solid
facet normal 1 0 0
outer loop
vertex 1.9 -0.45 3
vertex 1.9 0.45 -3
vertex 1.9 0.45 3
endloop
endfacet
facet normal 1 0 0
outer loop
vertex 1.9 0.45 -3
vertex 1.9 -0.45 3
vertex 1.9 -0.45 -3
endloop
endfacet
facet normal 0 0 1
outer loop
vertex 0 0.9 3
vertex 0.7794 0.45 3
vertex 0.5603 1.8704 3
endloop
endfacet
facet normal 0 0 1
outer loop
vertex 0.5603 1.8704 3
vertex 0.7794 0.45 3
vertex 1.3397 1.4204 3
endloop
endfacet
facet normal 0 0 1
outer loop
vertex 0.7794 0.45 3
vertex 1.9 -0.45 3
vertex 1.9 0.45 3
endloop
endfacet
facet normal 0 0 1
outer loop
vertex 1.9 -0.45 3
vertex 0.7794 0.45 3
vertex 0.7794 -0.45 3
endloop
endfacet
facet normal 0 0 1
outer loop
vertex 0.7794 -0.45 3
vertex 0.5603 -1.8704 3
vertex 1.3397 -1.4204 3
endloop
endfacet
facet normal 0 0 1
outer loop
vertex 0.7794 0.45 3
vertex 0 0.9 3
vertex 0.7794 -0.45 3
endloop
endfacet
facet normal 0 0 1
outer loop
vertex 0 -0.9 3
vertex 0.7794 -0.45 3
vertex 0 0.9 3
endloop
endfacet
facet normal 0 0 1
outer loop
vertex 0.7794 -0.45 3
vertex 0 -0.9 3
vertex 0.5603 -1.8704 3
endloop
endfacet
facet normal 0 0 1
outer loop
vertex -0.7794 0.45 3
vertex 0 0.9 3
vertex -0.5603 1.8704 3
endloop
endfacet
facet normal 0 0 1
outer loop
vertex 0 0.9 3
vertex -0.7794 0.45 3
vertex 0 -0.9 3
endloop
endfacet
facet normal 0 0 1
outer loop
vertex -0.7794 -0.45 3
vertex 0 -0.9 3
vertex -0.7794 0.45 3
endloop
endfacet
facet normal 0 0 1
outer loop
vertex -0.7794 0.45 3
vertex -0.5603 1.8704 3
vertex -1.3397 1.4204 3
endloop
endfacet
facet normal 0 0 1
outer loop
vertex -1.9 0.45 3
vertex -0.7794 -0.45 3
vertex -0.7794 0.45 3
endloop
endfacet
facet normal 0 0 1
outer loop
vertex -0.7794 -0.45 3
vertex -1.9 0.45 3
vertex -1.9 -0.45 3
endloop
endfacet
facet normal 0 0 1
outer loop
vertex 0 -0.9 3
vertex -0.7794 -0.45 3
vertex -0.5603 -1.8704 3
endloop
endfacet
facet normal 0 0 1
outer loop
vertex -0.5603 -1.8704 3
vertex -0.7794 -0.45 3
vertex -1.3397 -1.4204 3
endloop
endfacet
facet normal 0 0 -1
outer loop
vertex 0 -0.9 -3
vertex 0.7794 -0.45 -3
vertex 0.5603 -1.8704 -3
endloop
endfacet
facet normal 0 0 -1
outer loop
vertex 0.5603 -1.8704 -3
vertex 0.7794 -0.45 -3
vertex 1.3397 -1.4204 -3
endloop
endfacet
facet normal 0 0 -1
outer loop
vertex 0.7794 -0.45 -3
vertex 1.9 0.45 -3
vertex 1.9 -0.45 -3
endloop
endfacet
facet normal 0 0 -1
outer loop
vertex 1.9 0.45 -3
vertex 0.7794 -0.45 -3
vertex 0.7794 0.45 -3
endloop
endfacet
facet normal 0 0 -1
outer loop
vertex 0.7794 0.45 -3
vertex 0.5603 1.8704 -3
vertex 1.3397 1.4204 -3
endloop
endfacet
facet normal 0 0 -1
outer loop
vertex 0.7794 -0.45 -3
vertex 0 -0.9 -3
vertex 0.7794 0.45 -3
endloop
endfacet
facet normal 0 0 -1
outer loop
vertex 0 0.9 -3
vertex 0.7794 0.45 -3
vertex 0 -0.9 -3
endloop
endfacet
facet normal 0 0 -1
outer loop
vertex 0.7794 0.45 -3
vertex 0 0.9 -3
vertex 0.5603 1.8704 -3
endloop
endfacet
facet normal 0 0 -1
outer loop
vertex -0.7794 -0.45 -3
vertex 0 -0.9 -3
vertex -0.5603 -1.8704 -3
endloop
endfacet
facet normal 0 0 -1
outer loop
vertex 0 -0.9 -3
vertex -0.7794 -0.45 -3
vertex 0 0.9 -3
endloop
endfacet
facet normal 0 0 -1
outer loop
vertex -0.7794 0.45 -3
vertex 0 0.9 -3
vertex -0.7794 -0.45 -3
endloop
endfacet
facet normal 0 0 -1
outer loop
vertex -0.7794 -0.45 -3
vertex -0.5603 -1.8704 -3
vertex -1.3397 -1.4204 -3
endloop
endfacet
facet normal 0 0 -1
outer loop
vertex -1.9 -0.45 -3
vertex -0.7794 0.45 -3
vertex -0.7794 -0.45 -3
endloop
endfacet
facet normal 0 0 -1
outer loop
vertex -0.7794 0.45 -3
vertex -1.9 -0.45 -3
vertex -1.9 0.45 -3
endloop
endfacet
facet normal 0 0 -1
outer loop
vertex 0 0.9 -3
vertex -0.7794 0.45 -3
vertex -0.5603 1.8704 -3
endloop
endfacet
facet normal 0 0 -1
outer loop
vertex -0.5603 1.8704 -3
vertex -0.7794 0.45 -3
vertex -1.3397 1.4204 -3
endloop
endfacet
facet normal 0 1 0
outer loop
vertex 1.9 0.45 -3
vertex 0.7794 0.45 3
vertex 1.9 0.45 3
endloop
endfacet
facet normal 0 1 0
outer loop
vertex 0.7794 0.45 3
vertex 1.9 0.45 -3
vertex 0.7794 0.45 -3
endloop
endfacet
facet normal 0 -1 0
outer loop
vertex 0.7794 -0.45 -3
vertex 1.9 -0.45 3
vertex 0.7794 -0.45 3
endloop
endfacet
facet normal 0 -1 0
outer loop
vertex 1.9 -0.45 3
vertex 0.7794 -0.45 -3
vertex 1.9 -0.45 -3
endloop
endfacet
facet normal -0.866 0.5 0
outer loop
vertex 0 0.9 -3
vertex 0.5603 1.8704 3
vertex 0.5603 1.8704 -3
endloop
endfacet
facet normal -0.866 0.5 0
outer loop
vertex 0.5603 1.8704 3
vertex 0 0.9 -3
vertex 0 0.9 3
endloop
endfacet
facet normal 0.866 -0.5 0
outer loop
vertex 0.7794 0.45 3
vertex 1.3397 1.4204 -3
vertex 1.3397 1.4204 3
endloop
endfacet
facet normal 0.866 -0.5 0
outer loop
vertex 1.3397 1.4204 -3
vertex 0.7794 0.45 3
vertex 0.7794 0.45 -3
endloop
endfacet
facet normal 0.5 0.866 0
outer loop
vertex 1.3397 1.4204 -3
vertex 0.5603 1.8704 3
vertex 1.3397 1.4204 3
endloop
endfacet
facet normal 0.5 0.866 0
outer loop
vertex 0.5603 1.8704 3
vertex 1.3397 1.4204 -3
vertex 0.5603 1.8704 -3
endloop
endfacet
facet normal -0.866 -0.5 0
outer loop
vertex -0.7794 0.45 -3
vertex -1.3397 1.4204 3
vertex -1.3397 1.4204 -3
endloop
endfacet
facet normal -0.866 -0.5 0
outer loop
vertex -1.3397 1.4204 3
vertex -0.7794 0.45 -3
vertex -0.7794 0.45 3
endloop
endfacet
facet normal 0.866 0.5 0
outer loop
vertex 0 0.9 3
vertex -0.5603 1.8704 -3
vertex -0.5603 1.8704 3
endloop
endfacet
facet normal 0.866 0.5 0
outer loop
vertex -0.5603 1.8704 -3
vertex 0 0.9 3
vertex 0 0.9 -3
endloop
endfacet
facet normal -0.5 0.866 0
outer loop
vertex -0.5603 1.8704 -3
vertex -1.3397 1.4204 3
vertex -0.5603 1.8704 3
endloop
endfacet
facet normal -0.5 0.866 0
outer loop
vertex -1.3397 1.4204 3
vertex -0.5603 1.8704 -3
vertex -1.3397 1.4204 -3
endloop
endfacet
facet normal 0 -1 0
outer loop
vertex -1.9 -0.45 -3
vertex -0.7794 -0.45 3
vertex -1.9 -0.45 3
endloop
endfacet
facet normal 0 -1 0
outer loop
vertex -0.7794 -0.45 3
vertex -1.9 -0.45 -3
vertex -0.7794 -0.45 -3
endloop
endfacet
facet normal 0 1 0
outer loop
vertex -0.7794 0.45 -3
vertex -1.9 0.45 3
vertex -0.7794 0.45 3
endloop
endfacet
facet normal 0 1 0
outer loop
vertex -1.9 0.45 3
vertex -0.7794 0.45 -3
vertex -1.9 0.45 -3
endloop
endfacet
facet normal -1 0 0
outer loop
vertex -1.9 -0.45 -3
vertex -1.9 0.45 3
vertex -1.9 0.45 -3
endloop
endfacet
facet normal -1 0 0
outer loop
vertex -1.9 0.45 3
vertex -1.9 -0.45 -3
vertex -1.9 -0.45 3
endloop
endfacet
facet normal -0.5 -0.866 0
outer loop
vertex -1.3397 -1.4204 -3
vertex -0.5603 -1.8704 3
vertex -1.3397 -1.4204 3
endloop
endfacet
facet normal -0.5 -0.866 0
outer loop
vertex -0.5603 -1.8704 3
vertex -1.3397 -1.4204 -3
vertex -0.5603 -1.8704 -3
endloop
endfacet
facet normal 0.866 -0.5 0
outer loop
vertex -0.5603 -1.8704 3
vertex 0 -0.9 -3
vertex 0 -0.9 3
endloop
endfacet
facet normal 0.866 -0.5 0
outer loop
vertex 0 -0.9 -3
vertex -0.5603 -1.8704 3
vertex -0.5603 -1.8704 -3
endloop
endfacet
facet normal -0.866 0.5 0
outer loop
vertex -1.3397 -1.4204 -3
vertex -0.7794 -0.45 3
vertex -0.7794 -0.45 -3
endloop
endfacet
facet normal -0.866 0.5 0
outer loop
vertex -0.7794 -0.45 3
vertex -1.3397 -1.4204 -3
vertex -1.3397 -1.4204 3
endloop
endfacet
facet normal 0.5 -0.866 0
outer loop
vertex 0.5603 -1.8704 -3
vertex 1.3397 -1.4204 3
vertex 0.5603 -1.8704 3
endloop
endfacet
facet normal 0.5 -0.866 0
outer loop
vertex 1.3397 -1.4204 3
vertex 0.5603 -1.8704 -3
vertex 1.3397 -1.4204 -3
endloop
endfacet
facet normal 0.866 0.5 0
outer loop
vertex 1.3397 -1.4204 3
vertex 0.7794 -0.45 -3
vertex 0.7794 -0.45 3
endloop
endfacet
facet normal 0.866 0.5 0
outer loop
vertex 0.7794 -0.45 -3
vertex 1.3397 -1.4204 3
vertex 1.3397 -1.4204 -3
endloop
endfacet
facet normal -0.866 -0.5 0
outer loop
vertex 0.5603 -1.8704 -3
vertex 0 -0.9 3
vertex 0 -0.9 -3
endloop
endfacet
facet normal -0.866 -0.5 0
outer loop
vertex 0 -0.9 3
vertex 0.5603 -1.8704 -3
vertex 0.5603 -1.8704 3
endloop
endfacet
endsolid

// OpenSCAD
// Radial parameters: [2.0, 0, 6]
radial_r     = 2.0;  // radius to the centers of the radial elements
radial_inner = 0;    // inner radius (0 = solid hub)
radial_rot   = 0;    // rotation in degrees
radial_segs  = 6;    // number of radial segments/elements
radial_h     = 6;    // height

module radial_object(r=radial_r, inner=radial_inner, rot=radial_rot, segs=radial_segs, h=radial_h) {
    eps = 0.01;
    overlap = 1.0;                 // 1–2mm overlap for solid connections
    r2 = max(r, eps);
    inner2 = max(min(inner, r2 - eps), 0);

    // Make the "radial" recognizable: a central hub + distinct repeated spokes around it.
    // Interpret [2.0, 0, 6] as: radius=2.0, rotation offset=0, count=6.
    hub_r = max(inner2 + 0.9, 0.9); // ensure visible hub even when inner=0
    spoke_len = max(1.2, r2);       // extend outward to clearly show radial pattern
    spoke_w = max(0.7, r2 * 0.45);  // chunky, readable spokes

    rotate([0, 0, rot])
    union() {
        // Central hub (solid)
        cylinder(r=hub_r, h=h, center=true, $fn=64);

        // Radial spokes (distinct repeated elements)
        for (i = [0:segs-1]) {
            rotate([0, 0, i * 360 / segs])
                // Place spoke so its inner end overlaps into the hub by 'overlap'
                translate([hub_r + spoke_len/2 - overlap, 0, 0])
                    cube([spoke_len, spoke_w, h], center=true);
        }
    }
}

radial_object();
